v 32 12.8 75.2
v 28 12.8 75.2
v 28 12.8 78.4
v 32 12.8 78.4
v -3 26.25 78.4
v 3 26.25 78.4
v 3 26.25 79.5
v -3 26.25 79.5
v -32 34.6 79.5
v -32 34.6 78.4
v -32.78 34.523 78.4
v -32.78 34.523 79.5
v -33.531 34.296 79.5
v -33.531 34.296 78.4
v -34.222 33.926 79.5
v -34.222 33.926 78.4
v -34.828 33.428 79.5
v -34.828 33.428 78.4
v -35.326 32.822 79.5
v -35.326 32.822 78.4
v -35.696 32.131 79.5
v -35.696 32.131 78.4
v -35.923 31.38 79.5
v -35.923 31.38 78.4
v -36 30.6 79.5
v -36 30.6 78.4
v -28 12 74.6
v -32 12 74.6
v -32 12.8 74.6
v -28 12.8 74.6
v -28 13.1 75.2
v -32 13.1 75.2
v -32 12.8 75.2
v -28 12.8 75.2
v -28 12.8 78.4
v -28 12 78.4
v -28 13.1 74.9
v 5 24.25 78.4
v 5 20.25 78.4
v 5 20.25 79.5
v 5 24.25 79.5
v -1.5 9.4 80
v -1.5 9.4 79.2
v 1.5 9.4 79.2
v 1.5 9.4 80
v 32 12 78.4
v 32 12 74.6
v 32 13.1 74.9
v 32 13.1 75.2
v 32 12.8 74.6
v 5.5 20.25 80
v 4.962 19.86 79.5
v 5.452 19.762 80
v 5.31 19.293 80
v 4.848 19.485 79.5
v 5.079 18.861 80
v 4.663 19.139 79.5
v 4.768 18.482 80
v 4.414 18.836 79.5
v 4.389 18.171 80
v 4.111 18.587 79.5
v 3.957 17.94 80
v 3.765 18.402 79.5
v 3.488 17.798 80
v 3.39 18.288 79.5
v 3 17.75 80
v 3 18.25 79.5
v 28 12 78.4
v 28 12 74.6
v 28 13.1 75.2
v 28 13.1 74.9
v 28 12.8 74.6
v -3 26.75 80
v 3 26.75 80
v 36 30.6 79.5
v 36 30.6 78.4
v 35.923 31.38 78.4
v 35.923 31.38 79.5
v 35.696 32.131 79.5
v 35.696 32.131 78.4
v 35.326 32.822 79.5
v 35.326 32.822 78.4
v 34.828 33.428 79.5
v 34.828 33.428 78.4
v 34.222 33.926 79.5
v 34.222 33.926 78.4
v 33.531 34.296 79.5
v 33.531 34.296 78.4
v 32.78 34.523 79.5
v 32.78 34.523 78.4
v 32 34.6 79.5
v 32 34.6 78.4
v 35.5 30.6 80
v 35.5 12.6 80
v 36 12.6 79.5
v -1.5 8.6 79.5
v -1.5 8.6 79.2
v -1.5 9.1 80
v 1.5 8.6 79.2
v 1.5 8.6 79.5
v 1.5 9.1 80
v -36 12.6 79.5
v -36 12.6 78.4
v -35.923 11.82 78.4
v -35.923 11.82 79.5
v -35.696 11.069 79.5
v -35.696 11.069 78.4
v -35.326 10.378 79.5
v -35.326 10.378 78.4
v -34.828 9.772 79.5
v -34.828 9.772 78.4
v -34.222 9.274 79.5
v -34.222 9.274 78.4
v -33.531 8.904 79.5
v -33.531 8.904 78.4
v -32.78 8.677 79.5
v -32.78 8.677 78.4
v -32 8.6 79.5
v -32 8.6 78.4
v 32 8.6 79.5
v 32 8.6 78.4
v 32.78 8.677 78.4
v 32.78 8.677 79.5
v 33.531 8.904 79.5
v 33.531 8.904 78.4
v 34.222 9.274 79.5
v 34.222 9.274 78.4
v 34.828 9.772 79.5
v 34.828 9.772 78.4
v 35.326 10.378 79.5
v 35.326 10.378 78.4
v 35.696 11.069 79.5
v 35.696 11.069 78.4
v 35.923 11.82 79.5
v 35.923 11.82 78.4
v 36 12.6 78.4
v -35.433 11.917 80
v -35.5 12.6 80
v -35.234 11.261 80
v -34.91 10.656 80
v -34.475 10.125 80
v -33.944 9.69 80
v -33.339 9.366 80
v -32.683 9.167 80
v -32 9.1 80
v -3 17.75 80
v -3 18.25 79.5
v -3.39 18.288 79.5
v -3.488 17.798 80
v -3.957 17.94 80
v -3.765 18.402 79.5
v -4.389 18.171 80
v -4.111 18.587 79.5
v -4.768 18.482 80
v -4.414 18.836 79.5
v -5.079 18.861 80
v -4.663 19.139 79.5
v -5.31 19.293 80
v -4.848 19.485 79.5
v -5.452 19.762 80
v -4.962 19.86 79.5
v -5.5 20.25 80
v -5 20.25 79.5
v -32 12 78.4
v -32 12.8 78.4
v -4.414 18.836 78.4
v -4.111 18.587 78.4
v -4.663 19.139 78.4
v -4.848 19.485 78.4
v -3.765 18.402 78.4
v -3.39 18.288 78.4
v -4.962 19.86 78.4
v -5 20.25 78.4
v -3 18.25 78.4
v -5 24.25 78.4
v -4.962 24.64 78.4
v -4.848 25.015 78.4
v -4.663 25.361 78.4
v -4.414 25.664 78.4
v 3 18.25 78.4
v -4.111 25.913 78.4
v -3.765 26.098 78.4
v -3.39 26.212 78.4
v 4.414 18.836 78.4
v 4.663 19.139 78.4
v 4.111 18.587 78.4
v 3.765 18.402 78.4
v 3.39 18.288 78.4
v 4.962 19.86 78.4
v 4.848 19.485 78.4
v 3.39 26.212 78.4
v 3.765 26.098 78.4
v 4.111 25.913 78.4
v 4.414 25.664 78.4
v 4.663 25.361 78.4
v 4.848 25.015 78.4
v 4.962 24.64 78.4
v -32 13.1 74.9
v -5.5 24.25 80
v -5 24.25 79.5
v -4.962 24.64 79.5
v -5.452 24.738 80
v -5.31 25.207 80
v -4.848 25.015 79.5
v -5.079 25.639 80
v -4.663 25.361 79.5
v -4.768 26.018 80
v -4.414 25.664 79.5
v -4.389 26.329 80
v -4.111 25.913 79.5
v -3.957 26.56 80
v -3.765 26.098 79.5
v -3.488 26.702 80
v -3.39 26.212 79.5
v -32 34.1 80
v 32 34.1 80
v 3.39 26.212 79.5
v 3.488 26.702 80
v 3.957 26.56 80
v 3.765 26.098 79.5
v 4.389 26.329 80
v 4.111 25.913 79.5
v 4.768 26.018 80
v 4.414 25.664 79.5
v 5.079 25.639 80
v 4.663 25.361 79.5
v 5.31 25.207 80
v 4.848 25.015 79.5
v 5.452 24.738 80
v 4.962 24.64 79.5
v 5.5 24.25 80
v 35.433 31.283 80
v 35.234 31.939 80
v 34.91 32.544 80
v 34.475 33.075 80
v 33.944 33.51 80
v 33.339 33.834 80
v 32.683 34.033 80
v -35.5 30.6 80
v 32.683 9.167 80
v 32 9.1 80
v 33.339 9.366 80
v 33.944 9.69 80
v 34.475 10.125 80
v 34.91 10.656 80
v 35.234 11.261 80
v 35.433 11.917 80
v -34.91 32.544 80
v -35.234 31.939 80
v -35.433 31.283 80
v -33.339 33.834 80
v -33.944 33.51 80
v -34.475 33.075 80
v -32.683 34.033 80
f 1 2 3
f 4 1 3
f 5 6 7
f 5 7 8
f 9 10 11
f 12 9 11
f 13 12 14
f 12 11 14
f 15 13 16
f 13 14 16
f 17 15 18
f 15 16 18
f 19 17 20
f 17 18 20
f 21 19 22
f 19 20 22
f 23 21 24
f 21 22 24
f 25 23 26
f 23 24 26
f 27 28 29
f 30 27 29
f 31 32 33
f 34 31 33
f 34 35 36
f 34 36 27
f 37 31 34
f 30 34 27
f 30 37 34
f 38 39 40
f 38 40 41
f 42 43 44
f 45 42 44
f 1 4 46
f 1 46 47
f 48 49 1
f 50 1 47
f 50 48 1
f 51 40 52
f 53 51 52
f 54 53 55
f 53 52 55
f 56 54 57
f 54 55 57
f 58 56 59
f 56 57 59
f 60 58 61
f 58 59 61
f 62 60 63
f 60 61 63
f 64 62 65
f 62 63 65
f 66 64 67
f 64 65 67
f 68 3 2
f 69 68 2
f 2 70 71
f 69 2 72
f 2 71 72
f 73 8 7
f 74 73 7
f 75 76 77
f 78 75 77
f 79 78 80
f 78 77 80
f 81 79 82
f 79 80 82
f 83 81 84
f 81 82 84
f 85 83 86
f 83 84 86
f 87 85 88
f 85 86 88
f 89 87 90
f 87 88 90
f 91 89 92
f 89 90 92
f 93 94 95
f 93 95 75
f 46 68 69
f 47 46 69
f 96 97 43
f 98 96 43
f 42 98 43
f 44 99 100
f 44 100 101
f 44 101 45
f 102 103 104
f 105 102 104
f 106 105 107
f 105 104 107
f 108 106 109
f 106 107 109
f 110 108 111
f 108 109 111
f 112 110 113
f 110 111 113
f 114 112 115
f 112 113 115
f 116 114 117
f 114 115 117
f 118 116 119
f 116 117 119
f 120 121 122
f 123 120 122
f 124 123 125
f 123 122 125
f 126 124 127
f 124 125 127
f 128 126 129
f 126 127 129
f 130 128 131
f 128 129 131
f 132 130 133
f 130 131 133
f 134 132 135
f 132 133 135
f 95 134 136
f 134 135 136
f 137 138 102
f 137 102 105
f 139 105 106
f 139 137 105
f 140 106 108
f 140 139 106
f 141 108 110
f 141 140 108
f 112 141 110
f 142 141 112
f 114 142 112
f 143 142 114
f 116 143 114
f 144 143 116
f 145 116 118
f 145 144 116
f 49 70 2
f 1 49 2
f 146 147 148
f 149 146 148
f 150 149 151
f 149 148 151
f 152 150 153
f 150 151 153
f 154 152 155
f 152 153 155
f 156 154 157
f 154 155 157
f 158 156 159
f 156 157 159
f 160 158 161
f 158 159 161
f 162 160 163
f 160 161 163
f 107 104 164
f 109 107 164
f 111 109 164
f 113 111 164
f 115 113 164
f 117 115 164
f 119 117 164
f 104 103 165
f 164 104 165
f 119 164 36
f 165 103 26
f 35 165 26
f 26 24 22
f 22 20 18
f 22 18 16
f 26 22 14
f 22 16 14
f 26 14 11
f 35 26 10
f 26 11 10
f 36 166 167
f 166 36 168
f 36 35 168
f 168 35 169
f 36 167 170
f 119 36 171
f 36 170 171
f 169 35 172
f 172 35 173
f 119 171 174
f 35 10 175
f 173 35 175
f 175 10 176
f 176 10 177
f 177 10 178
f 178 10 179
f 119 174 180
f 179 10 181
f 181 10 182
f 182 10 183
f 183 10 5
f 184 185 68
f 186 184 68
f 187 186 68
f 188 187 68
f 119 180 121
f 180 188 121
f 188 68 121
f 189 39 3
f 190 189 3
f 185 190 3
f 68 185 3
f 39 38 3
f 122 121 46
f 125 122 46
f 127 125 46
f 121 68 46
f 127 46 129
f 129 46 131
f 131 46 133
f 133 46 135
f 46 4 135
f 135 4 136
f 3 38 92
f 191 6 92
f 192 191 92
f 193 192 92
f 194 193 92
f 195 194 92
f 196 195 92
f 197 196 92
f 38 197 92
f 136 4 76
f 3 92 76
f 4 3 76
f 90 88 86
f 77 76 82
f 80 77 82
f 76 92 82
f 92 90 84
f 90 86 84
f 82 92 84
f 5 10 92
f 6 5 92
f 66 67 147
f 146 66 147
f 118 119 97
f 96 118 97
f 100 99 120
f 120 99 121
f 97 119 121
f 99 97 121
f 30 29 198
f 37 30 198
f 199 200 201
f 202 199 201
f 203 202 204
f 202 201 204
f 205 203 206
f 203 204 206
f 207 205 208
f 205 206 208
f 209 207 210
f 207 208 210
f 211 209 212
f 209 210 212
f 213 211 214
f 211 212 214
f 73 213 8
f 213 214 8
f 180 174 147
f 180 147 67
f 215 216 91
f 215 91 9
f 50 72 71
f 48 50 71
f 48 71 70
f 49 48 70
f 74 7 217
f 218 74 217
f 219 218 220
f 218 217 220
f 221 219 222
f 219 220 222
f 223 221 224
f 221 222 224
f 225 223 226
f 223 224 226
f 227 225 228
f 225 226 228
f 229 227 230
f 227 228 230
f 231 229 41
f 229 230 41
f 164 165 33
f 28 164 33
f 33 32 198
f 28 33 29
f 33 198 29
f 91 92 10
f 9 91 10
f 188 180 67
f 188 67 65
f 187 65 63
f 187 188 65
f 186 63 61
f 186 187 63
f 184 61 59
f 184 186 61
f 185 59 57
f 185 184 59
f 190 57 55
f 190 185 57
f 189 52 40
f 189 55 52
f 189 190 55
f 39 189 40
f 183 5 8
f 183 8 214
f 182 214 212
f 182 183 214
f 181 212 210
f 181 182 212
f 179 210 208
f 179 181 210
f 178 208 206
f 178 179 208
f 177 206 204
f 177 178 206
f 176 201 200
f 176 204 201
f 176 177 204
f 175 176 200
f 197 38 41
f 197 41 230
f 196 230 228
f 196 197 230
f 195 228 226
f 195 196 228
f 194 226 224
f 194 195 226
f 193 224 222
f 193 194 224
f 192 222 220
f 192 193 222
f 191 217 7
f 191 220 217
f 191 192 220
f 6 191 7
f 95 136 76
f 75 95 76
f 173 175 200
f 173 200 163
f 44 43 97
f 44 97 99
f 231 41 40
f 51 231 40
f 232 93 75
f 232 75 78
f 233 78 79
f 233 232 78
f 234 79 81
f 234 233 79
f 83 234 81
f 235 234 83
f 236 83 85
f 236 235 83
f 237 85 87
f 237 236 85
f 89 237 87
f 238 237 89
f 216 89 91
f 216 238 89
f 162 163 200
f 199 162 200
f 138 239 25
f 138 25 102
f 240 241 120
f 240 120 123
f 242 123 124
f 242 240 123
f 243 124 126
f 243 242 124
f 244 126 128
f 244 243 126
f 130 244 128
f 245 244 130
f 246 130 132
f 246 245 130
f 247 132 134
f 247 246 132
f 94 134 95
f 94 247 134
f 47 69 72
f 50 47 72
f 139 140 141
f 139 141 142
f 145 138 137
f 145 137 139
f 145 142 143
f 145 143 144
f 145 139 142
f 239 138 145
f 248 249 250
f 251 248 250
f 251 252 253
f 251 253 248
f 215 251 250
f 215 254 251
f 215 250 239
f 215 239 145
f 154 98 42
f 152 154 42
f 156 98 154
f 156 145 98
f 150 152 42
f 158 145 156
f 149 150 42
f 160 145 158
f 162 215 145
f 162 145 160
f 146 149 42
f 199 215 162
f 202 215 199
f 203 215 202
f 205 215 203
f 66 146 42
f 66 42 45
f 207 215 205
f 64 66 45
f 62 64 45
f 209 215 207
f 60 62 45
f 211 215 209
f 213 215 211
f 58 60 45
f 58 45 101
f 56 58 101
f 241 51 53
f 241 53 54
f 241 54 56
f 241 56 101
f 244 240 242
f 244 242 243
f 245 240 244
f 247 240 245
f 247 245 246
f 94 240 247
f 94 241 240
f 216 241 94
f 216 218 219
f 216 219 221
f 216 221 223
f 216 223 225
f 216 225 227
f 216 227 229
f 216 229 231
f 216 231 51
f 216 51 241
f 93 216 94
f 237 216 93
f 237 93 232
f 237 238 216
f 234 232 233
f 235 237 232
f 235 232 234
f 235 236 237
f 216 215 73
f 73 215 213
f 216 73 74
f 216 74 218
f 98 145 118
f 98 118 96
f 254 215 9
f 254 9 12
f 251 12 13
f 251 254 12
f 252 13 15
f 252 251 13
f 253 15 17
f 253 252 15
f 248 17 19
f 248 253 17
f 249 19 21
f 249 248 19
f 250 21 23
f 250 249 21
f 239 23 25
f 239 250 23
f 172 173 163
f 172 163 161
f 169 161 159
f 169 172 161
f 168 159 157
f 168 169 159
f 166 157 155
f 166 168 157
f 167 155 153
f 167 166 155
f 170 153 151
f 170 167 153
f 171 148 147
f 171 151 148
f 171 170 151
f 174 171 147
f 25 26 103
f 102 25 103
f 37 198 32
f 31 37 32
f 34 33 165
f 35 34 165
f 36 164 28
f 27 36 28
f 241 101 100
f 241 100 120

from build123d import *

# Parameters (mm, degrees)
BOSS_EXTRUDE1_START = 78.4
BOSS_EXTRUDE1_DEPTH = 1.6
CHAMFER1_SIZE       = 0.5
BOSS_EXTRUDE2_START = 78
BOSS_EXTRUDE2_DEPTH = 3
CHAMFER2_SIZE       = 0.5
BOSS_EXTRUDE3_START = 79.2
SKETCH3_W           = 3
SKETCH3_H           = 0.9
BOSS_EXTRUDE3_DEPTH = 0.9
BOSS_EXTRUDE4_START = -32
BOSS_EXTRUDE4_DEPTH = 4
BOSS_EXTRUDE5_START = 28
BOSS_EXTRUDE5_DEPTH = 4


with BuildPart() as part:
    # Sketch1 → Boss-Extrude1 (new body)
    with BuildSketch(Plane.XY.offset(BOSS_EXTRUDE1_START)):
        with BuildLine():
            Line((-32, 8.6), (32, 8.6))
            ThreePointArc((32, 8.6), (34.828427125, 9.771572875), (36, 12.6))
            Line((36, 12.6), (36, 30.6))
            ThreePointArc((36, 30.6), (34.828427125, 33.428427125), (32, 34.6))
            Line((32, 34.6), (-32, 34.6))
            ThreePointArc((-32, 34.6), (-34.828427125, 33.428427125), (-36, 30.6))
            Line((-36, 30.6), (-36, 12.6))
            ThreePointArc((-36, 12.6), (-34.828427125, 9.771572875), (-32, 8.6))
        make_face()
    extrude(amount=BOSS_EXTRUDE1_DEPTH)

    # Chamfer1
    chamfer1_edges = [part.edges().sort_by_distance(p)[0] for p in [
        (34.828427125, 9.771572875, 80),
        (36, 21.6, 80),
        (34.828427125, 33.428427125, 80),
        (0, 34.6, 80),
        (-34.828427125, 33.428427125, 80),
        (-36, 21.6, 80),
        (-34.828427125, 9.771572875, 80),
        (0, 8.6, 80),
    ]]
    chamfer(chamfer1_edges, length=CHAMFER1_SIZE)


with BuildPart() as body_2:
    # Sketch2 → Boss-Extrude2 (new body)
    with BuildSketch(Plane.XY.offset(BOSS_EXTRUDE2_START)):
        with BuildLine():
            Line((-3, 18.25), (3, 18.25))
            ThreePointArc((3, 18.25), (4.414213562, 18.835786438), (5, 20.25))
            Line((5, 20.25), (5, 24.25))
            ThreePointArc((5, 24.25), (4.414213562, 25.664213562), (3, 26.25))
            Line((3, 26.25), (-3, 26.25))
            ThreePointArc((-3, 26.25), (-4.414213562, 25.664213562), (-5, 24.25))
            Line((-5, 24.25), (-5, 20.25))
            ThreePointArc((-5, 20.25), (-4.414213562, 18.835786438), (-3, 18.25))
        make_face()
    extrude(amount=BOSS_EXTRUDE2_DEPTH)


with BuildPart() as part_1:
    add(part.part)

    # Combine1: cut body 2
    add(body_2.part, mode=Mode.SUBTRACT)

    # Chamfer2
    chamfer2_edges = [part_1.edges().sort_by_distance(p)[0] for p in [
        (-4.414213562, 18.835786438, 80),
        (0, 18.25, 80),
        (4.414213562, 18.835786438, 80),
        (5, 22.25, 80),
        (4.414213562, 25.664213562, 80),
        (0, 26.25, 80),
        (-4.414213562, 25.664213562, 80),
        (-5, 22.25, 80),
    ]]
    chamfer(chamfer2_edges, length=CHAMFER2_SIZE)


with BuildPart() as body_2_2:
    # Sketch3 → Boss-Extrude3 (new body)
    with BuildSketch(Plane.XY.offset(BOSS_EXTRUDE3_START)):
        with Locations((0, 8.95)):
            Rectangle(SKETCH3_W, SKETCH3_H)
    extrude(amount=BOSS_EXTRUDE3_DEPTH)


with BuildPart() as part_2:
    add(part_1.part)

    # Combine2: cut body 2 2
    add(body_2_2.part, mode=Mode.SUBTRACT)

    # Sketch4 → Boss-Extrude4 (add)
    with BuildSketch(Plane(origin=(0, 0, 0), x_dir=(0, 0, -1), z_dir=(1, 0, 0)).offset(BOSS_EXTRUDE4_START)):
        Polygon((-78.41, 12), (-74.6, 12), (-74.6, 12.8), (-74.9, 13.1), (-75.2, 13.1), (-75.2, 12.8), (-78.41, 12.8), align=None)
    extrude(amount=BOSS_EXTRUDE4_DEPTH)

    # Sketch5 → Boss-Extrude5 (add)
    with BuildSketch(Plane(origin=(0, 0, 0), x_dir=(0, 0, -1), z_dir=(1, 0, 0)).offset(BOSS_EXTRUDE5_START)):
        Polygon((-78.41, 12), (-74.6, 12), (-74.6, 12.8), (-74.9, 13.1), (-75.2, 13.1), (-75.2, 12.8), (-78.41, 12.8), align=None)
    extrude(amount=BOSS_EXTRUDE5_DEPTH)


solid = part_2.part
